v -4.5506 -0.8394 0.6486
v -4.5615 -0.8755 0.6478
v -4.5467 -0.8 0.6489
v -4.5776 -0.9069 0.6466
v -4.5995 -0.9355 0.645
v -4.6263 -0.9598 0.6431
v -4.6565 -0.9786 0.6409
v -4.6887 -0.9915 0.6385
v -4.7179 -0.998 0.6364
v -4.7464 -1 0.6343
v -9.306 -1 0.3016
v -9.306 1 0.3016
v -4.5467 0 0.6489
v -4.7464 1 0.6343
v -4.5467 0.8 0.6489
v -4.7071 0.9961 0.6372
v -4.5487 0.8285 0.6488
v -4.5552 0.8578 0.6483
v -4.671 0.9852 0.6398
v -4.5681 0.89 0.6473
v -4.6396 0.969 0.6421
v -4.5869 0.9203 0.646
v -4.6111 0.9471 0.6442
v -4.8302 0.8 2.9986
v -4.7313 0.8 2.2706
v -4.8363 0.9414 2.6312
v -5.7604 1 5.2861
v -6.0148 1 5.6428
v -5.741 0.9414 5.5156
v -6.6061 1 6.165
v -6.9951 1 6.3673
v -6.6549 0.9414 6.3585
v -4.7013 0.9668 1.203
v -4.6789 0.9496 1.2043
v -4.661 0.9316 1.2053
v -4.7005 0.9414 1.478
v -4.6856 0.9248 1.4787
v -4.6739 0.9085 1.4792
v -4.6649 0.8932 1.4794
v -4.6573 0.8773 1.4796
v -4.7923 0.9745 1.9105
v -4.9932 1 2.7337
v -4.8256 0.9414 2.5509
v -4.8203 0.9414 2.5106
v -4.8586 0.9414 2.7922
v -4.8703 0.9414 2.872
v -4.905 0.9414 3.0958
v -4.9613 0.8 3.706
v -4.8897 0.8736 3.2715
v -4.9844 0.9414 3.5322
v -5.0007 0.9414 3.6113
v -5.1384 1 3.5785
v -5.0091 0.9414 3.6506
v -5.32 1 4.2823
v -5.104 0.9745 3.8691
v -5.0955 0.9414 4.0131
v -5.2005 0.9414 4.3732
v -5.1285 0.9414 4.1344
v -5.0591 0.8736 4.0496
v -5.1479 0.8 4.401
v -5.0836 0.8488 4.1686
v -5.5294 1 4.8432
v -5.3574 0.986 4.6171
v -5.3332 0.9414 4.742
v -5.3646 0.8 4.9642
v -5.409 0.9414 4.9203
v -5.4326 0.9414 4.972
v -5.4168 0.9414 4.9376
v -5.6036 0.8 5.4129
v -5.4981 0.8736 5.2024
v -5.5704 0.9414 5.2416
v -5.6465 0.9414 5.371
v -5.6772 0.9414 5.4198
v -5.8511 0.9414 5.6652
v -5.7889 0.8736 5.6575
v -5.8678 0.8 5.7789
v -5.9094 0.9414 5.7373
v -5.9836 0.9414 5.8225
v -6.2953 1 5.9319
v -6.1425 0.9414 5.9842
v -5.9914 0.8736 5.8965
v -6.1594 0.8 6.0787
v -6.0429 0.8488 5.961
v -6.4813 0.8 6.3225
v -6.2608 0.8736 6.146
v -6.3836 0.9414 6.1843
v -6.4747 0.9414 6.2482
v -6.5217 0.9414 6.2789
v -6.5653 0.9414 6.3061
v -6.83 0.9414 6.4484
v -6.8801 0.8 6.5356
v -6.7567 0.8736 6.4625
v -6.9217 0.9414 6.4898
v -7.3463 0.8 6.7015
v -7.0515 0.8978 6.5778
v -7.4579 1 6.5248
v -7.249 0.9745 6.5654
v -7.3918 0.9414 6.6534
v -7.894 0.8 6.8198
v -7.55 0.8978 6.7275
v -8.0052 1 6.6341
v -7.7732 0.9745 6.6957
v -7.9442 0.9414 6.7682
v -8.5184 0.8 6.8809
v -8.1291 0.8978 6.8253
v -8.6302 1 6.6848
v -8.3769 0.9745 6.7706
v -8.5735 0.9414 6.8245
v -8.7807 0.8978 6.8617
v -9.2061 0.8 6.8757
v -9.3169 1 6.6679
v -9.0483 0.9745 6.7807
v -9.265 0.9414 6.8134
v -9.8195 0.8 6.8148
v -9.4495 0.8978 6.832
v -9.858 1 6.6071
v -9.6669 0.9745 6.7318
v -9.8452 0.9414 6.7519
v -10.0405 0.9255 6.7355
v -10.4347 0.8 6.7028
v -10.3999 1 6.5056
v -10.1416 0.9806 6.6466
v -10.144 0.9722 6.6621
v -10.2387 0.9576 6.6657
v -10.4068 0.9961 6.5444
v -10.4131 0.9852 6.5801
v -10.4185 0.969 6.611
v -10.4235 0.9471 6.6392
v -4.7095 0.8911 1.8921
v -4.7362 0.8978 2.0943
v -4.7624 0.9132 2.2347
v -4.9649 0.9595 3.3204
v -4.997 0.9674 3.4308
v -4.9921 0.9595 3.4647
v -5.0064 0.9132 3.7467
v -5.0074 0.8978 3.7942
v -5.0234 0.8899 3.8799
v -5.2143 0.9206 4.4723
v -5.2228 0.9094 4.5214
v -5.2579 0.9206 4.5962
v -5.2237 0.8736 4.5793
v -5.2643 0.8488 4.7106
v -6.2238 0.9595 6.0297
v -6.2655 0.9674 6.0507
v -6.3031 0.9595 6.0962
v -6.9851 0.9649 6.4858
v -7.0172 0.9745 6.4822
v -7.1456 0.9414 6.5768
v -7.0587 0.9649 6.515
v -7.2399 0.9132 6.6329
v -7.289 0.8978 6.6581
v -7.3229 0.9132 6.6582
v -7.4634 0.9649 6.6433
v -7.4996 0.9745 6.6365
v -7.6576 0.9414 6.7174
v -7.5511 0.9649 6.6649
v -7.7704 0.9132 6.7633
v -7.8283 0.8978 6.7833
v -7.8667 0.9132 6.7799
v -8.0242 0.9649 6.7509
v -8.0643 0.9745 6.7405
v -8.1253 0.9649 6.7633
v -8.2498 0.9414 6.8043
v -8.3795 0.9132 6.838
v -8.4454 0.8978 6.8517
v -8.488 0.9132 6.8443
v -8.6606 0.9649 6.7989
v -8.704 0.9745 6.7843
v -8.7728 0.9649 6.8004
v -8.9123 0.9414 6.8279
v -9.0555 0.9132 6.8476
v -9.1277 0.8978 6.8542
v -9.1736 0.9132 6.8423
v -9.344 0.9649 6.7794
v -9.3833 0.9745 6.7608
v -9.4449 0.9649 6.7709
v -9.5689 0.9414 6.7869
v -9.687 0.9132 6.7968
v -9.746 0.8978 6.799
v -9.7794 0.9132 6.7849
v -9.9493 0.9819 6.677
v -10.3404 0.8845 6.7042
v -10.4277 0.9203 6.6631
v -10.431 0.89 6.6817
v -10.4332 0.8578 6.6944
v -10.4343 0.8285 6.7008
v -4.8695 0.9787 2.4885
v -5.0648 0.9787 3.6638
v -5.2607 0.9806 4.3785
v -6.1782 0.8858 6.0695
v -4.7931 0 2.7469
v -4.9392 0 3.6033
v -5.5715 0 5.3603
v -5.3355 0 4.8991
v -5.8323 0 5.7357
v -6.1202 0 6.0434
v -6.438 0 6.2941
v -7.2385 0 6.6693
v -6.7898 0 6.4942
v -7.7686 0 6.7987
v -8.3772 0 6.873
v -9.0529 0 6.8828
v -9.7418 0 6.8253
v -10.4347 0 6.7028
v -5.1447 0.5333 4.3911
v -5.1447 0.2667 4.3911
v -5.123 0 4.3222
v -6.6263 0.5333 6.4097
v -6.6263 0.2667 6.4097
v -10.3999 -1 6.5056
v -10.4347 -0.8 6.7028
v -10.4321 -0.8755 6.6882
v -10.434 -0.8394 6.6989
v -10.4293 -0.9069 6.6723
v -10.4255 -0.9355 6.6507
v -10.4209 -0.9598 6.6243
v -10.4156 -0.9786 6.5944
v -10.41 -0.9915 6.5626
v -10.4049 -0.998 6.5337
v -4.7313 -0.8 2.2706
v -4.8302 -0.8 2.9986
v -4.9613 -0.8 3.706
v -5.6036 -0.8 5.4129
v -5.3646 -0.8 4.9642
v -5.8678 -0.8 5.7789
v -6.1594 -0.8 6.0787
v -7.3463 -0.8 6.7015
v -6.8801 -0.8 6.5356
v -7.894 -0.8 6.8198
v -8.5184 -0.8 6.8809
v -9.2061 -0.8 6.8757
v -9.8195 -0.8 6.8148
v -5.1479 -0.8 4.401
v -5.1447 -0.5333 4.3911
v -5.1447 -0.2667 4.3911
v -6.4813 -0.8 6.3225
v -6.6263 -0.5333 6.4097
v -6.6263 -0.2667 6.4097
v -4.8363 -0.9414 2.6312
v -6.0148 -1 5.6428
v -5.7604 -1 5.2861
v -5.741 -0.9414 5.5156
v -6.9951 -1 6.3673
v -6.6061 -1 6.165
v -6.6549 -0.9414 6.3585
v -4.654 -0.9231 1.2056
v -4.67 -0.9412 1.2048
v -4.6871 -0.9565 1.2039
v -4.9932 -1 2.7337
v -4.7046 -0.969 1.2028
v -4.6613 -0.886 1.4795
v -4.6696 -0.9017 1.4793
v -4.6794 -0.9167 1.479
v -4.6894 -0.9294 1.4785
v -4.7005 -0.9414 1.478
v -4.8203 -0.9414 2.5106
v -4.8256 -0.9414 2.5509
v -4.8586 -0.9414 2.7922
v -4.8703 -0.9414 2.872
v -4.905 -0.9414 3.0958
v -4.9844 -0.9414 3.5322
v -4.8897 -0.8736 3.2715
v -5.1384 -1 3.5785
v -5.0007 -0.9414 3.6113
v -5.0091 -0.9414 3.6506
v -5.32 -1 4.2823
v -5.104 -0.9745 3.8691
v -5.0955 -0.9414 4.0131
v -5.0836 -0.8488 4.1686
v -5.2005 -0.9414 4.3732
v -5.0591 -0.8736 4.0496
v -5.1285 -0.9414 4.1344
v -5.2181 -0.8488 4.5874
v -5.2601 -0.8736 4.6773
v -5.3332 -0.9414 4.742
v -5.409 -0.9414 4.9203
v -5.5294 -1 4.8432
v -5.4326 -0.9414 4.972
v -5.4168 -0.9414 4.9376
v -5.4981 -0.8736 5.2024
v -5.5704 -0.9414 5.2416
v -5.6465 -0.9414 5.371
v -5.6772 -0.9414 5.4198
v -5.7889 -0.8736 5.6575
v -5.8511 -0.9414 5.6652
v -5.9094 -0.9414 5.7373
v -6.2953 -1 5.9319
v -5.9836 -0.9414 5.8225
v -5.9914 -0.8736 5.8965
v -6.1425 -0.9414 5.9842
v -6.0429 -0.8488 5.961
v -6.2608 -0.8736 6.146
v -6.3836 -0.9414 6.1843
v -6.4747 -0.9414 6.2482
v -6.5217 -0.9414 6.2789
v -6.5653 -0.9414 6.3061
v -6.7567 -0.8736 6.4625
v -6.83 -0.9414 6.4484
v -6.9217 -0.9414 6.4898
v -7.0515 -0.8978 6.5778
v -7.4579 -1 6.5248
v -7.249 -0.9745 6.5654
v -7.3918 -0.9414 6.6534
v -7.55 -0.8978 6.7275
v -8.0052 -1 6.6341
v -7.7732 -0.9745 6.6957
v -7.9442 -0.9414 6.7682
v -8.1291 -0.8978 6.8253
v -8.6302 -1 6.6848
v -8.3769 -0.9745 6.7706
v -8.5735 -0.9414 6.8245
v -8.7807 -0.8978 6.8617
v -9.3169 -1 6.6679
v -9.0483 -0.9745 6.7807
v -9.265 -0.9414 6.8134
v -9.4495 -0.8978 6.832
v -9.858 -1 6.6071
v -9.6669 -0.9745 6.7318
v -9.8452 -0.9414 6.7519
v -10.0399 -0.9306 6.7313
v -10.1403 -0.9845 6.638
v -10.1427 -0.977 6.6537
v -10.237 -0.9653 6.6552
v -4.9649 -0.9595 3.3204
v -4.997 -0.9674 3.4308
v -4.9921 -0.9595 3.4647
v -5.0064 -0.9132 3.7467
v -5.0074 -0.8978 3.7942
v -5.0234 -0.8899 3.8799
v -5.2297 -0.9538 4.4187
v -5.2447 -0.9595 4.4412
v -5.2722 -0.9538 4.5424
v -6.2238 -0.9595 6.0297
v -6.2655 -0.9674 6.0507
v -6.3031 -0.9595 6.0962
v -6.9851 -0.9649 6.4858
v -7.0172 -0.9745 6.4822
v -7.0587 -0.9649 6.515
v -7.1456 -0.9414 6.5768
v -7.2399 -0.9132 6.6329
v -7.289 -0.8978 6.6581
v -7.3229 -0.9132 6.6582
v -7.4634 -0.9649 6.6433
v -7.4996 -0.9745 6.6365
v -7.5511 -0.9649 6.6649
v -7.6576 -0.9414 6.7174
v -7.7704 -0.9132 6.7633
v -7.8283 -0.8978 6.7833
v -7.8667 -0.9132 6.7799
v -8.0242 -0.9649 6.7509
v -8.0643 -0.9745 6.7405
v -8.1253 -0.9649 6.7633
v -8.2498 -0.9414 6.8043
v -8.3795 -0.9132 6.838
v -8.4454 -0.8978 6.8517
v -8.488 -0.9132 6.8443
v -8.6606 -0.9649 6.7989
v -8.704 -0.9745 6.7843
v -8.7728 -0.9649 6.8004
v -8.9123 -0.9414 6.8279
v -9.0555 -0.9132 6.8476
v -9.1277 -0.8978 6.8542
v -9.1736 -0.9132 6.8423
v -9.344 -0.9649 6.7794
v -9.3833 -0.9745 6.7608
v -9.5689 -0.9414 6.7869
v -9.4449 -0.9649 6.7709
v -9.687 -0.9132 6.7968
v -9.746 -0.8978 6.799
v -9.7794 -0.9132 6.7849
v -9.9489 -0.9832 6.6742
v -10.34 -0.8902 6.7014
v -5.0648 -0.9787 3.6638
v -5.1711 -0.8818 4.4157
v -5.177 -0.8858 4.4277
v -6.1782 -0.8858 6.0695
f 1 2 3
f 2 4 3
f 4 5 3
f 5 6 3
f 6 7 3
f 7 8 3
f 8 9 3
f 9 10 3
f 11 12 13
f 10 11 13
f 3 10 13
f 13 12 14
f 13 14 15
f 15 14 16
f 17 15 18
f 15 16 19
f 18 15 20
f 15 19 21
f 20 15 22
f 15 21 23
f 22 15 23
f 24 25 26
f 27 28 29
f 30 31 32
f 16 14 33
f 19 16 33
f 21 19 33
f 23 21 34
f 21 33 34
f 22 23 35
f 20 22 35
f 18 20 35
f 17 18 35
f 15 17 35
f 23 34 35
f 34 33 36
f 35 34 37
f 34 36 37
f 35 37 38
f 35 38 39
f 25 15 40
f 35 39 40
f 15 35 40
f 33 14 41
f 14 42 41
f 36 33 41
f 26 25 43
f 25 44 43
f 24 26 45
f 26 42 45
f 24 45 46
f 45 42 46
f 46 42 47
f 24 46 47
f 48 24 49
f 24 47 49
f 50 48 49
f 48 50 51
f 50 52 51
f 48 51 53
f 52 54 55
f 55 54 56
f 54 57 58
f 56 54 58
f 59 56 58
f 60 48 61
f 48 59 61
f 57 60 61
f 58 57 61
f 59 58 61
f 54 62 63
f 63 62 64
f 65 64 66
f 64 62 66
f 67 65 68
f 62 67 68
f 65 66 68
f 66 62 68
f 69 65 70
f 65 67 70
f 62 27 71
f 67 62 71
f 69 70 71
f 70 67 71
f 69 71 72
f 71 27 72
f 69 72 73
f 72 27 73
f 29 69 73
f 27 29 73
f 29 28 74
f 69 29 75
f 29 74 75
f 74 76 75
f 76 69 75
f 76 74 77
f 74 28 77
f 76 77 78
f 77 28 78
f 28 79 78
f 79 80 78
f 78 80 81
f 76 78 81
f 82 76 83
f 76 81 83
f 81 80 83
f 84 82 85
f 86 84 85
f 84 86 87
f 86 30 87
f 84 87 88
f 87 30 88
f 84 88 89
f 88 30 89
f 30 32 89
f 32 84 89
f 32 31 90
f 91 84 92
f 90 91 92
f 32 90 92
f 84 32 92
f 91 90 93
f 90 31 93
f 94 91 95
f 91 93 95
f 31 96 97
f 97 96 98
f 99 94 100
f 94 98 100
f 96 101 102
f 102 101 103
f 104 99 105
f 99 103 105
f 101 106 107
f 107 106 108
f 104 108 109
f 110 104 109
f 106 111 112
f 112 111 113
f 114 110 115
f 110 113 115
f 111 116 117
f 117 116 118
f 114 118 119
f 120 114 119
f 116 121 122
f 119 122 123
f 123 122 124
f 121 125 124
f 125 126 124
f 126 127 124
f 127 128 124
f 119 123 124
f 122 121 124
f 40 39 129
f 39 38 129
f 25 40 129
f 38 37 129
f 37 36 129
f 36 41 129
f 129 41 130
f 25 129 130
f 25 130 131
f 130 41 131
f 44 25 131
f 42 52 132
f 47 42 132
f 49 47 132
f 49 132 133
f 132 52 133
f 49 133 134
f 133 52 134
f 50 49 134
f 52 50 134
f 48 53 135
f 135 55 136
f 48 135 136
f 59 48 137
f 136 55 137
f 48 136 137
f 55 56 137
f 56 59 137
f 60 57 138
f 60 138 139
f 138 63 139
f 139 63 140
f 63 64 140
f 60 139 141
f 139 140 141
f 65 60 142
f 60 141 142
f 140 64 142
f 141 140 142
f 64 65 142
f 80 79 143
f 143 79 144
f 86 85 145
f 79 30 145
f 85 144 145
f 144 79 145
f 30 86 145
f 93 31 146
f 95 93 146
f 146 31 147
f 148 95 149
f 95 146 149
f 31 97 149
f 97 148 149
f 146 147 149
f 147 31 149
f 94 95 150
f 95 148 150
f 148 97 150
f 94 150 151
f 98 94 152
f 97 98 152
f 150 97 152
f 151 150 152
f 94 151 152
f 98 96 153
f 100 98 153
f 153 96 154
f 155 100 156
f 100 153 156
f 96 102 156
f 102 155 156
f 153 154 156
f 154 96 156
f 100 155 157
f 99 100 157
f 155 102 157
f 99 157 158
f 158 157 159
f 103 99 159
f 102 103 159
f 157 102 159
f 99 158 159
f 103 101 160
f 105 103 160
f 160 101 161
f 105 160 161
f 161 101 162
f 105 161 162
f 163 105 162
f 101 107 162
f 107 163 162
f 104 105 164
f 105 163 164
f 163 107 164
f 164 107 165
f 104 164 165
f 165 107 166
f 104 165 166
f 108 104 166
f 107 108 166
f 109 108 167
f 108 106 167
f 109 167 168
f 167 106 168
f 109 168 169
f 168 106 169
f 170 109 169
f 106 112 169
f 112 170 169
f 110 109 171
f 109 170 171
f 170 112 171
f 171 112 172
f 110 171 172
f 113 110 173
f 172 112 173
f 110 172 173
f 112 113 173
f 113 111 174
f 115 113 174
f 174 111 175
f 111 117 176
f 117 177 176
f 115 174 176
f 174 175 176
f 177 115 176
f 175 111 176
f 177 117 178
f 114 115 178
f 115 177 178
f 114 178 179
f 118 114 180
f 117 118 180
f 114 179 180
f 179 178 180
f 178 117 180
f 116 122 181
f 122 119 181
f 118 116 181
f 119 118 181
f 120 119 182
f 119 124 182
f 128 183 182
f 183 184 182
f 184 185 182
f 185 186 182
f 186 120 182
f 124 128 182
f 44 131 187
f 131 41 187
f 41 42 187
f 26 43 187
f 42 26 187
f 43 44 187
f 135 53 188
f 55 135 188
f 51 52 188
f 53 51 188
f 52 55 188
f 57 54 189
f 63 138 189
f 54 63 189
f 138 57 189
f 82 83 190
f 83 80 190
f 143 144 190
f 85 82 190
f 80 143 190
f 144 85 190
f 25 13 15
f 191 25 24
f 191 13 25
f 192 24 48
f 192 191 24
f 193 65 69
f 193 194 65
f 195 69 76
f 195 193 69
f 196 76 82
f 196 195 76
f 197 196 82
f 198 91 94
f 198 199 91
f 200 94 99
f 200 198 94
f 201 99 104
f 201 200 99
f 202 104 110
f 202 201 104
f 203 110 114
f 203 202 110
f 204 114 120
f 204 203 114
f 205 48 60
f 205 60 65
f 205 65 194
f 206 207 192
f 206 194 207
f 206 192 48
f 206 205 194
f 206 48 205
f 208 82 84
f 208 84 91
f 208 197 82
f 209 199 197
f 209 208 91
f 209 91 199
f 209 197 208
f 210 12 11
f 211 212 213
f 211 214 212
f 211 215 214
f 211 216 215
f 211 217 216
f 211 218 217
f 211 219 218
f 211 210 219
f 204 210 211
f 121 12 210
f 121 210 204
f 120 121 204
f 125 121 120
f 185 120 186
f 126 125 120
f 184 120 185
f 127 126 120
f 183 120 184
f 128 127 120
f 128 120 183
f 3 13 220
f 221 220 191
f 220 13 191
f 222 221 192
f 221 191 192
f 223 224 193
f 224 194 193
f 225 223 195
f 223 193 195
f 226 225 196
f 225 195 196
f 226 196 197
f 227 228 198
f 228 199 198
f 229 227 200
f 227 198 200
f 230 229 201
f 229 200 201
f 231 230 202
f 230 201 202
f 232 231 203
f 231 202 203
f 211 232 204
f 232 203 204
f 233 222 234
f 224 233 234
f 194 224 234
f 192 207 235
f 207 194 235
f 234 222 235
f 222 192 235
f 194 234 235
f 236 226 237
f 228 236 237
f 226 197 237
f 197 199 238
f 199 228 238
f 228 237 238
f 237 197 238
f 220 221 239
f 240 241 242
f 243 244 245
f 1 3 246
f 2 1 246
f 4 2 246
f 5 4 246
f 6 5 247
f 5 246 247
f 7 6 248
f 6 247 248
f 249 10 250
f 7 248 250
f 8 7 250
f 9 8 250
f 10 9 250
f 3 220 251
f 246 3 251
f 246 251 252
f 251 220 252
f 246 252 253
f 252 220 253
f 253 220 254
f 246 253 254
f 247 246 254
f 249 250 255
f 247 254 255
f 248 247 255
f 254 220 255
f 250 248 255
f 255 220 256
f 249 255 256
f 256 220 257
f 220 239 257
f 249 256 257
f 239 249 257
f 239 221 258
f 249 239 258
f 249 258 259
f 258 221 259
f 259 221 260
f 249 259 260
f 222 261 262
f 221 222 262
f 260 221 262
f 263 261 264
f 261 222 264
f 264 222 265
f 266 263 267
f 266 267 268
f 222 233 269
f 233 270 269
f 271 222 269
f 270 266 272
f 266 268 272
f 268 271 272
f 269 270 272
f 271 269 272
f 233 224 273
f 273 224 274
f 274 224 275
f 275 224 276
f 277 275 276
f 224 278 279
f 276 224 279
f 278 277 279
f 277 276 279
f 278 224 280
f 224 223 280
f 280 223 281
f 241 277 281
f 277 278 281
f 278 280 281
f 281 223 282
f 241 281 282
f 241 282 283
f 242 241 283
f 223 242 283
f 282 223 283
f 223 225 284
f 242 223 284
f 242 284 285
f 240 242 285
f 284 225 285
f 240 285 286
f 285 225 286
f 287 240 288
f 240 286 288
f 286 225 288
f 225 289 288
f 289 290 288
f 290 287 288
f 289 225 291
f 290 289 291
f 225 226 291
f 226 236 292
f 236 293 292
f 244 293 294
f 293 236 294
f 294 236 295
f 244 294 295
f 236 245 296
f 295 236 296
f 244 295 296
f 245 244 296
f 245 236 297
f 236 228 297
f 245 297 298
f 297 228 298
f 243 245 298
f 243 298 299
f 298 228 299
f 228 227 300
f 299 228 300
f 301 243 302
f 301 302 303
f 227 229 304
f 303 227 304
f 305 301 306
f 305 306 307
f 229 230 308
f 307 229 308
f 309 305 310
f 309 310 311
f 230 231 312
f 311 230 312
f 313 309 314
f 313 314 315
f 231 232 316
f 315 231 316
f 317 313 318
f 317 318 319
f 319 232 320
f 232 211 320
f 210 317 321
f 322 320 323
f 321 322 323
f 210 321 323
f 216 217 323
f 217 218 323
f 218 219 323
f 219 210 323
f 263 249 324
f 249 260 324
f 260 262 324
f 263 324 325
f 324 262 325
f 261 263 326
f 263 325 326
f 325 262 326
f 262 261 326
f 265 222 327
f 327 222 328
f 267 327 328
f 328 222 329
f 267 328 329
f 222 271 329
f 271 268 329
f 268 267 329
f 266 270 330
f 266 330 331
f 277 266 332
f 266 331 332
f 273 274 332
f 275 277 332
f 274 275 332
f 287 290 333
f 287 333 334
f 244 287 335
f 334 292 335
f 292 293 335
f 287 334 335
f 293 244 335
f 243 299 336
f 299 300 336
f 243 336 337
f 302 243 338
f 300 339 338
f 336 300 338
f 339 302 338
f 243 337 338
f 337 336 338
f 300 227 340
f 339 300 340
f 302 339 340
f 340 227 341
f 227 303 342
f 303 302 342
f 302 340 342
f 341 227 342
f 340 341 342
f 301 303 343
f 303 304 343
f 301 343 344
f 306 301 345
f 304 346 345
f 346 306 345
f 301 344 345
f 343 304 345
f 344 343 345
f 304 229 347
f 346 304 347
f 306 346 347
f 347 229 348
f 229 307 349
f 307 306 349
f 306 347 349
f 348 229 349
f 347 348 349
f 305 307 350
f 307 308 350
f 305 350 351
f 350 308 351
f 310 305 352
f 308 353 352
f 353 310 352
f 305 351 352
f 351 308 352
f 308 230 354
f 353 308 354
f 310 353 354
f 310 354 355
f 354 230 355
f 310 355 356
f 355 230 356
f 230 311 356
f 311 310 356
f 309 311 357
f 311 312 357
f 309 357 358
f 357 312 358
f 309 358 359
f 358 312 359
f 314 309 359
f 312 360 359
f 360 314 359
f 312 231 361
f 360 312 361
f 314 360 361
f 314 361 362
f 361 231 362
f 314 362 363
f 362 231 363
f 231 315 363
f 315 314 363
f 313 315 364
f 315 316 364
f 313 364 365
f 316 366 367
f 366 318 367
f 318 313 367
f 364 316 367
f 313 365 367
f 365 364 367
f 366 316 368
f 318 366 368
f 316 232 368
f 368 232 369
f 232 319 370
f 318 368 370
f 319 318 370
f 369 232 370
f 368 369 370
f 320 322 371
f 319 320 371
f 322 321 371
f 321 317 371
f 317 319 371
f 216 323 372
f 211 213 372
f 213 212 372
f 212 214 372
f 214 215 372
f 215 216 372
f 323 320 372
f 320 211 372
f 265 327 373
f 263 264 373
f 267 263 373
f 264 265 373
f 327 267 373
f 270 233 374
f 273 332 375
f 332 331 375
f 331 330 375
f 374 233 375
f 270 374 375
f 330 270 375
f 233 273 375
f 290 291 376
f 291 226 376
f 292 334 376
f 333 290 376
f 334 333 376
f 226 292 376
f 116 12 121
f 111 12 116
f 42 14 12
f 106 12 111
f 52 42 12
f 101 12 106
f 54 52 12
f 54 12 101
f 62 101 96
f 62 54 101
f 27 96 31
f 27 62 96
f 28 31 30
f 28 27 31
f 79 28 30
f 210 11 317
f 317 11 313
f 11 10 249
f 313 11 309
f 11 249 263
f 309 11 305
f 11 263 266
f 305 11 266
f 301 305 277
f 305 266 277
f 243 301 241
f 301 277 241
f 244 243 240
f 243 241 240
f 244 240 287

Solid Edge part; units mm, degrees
sketch "Sketch1" plane through (0, 0, 0) normal (0, -1, 0) x (1, 0, 0)
  line L0 (-9.306, 0.3016) -> (-10.4347, 6.7028)
  spline S0 degree 3 poles (-4.5467, 0.6489) (-4.7187, 2.0586) (-4.8492, 4.2451) (-6.3659, 6.8787) (-9.0415, 7.0147) (-10.4347, 6.7028) knots 0 0 0 0 0.371964 0.655797 1 1 1 1
  line L1 (-9.306, 0.3016) -> (-4.5467, 0.6489)
extrude "Protrusion1" add sketch "Sketch1" along normal mid plane 2
fillet "Round_1" radius 0.2 1 edges at (-5.7206, -1, 5.5885)
fillet "Round_2" radius 0.2 1 edges at (-5.7206, 1, 5.5885)
properties material "Polypropylene, high impact"
